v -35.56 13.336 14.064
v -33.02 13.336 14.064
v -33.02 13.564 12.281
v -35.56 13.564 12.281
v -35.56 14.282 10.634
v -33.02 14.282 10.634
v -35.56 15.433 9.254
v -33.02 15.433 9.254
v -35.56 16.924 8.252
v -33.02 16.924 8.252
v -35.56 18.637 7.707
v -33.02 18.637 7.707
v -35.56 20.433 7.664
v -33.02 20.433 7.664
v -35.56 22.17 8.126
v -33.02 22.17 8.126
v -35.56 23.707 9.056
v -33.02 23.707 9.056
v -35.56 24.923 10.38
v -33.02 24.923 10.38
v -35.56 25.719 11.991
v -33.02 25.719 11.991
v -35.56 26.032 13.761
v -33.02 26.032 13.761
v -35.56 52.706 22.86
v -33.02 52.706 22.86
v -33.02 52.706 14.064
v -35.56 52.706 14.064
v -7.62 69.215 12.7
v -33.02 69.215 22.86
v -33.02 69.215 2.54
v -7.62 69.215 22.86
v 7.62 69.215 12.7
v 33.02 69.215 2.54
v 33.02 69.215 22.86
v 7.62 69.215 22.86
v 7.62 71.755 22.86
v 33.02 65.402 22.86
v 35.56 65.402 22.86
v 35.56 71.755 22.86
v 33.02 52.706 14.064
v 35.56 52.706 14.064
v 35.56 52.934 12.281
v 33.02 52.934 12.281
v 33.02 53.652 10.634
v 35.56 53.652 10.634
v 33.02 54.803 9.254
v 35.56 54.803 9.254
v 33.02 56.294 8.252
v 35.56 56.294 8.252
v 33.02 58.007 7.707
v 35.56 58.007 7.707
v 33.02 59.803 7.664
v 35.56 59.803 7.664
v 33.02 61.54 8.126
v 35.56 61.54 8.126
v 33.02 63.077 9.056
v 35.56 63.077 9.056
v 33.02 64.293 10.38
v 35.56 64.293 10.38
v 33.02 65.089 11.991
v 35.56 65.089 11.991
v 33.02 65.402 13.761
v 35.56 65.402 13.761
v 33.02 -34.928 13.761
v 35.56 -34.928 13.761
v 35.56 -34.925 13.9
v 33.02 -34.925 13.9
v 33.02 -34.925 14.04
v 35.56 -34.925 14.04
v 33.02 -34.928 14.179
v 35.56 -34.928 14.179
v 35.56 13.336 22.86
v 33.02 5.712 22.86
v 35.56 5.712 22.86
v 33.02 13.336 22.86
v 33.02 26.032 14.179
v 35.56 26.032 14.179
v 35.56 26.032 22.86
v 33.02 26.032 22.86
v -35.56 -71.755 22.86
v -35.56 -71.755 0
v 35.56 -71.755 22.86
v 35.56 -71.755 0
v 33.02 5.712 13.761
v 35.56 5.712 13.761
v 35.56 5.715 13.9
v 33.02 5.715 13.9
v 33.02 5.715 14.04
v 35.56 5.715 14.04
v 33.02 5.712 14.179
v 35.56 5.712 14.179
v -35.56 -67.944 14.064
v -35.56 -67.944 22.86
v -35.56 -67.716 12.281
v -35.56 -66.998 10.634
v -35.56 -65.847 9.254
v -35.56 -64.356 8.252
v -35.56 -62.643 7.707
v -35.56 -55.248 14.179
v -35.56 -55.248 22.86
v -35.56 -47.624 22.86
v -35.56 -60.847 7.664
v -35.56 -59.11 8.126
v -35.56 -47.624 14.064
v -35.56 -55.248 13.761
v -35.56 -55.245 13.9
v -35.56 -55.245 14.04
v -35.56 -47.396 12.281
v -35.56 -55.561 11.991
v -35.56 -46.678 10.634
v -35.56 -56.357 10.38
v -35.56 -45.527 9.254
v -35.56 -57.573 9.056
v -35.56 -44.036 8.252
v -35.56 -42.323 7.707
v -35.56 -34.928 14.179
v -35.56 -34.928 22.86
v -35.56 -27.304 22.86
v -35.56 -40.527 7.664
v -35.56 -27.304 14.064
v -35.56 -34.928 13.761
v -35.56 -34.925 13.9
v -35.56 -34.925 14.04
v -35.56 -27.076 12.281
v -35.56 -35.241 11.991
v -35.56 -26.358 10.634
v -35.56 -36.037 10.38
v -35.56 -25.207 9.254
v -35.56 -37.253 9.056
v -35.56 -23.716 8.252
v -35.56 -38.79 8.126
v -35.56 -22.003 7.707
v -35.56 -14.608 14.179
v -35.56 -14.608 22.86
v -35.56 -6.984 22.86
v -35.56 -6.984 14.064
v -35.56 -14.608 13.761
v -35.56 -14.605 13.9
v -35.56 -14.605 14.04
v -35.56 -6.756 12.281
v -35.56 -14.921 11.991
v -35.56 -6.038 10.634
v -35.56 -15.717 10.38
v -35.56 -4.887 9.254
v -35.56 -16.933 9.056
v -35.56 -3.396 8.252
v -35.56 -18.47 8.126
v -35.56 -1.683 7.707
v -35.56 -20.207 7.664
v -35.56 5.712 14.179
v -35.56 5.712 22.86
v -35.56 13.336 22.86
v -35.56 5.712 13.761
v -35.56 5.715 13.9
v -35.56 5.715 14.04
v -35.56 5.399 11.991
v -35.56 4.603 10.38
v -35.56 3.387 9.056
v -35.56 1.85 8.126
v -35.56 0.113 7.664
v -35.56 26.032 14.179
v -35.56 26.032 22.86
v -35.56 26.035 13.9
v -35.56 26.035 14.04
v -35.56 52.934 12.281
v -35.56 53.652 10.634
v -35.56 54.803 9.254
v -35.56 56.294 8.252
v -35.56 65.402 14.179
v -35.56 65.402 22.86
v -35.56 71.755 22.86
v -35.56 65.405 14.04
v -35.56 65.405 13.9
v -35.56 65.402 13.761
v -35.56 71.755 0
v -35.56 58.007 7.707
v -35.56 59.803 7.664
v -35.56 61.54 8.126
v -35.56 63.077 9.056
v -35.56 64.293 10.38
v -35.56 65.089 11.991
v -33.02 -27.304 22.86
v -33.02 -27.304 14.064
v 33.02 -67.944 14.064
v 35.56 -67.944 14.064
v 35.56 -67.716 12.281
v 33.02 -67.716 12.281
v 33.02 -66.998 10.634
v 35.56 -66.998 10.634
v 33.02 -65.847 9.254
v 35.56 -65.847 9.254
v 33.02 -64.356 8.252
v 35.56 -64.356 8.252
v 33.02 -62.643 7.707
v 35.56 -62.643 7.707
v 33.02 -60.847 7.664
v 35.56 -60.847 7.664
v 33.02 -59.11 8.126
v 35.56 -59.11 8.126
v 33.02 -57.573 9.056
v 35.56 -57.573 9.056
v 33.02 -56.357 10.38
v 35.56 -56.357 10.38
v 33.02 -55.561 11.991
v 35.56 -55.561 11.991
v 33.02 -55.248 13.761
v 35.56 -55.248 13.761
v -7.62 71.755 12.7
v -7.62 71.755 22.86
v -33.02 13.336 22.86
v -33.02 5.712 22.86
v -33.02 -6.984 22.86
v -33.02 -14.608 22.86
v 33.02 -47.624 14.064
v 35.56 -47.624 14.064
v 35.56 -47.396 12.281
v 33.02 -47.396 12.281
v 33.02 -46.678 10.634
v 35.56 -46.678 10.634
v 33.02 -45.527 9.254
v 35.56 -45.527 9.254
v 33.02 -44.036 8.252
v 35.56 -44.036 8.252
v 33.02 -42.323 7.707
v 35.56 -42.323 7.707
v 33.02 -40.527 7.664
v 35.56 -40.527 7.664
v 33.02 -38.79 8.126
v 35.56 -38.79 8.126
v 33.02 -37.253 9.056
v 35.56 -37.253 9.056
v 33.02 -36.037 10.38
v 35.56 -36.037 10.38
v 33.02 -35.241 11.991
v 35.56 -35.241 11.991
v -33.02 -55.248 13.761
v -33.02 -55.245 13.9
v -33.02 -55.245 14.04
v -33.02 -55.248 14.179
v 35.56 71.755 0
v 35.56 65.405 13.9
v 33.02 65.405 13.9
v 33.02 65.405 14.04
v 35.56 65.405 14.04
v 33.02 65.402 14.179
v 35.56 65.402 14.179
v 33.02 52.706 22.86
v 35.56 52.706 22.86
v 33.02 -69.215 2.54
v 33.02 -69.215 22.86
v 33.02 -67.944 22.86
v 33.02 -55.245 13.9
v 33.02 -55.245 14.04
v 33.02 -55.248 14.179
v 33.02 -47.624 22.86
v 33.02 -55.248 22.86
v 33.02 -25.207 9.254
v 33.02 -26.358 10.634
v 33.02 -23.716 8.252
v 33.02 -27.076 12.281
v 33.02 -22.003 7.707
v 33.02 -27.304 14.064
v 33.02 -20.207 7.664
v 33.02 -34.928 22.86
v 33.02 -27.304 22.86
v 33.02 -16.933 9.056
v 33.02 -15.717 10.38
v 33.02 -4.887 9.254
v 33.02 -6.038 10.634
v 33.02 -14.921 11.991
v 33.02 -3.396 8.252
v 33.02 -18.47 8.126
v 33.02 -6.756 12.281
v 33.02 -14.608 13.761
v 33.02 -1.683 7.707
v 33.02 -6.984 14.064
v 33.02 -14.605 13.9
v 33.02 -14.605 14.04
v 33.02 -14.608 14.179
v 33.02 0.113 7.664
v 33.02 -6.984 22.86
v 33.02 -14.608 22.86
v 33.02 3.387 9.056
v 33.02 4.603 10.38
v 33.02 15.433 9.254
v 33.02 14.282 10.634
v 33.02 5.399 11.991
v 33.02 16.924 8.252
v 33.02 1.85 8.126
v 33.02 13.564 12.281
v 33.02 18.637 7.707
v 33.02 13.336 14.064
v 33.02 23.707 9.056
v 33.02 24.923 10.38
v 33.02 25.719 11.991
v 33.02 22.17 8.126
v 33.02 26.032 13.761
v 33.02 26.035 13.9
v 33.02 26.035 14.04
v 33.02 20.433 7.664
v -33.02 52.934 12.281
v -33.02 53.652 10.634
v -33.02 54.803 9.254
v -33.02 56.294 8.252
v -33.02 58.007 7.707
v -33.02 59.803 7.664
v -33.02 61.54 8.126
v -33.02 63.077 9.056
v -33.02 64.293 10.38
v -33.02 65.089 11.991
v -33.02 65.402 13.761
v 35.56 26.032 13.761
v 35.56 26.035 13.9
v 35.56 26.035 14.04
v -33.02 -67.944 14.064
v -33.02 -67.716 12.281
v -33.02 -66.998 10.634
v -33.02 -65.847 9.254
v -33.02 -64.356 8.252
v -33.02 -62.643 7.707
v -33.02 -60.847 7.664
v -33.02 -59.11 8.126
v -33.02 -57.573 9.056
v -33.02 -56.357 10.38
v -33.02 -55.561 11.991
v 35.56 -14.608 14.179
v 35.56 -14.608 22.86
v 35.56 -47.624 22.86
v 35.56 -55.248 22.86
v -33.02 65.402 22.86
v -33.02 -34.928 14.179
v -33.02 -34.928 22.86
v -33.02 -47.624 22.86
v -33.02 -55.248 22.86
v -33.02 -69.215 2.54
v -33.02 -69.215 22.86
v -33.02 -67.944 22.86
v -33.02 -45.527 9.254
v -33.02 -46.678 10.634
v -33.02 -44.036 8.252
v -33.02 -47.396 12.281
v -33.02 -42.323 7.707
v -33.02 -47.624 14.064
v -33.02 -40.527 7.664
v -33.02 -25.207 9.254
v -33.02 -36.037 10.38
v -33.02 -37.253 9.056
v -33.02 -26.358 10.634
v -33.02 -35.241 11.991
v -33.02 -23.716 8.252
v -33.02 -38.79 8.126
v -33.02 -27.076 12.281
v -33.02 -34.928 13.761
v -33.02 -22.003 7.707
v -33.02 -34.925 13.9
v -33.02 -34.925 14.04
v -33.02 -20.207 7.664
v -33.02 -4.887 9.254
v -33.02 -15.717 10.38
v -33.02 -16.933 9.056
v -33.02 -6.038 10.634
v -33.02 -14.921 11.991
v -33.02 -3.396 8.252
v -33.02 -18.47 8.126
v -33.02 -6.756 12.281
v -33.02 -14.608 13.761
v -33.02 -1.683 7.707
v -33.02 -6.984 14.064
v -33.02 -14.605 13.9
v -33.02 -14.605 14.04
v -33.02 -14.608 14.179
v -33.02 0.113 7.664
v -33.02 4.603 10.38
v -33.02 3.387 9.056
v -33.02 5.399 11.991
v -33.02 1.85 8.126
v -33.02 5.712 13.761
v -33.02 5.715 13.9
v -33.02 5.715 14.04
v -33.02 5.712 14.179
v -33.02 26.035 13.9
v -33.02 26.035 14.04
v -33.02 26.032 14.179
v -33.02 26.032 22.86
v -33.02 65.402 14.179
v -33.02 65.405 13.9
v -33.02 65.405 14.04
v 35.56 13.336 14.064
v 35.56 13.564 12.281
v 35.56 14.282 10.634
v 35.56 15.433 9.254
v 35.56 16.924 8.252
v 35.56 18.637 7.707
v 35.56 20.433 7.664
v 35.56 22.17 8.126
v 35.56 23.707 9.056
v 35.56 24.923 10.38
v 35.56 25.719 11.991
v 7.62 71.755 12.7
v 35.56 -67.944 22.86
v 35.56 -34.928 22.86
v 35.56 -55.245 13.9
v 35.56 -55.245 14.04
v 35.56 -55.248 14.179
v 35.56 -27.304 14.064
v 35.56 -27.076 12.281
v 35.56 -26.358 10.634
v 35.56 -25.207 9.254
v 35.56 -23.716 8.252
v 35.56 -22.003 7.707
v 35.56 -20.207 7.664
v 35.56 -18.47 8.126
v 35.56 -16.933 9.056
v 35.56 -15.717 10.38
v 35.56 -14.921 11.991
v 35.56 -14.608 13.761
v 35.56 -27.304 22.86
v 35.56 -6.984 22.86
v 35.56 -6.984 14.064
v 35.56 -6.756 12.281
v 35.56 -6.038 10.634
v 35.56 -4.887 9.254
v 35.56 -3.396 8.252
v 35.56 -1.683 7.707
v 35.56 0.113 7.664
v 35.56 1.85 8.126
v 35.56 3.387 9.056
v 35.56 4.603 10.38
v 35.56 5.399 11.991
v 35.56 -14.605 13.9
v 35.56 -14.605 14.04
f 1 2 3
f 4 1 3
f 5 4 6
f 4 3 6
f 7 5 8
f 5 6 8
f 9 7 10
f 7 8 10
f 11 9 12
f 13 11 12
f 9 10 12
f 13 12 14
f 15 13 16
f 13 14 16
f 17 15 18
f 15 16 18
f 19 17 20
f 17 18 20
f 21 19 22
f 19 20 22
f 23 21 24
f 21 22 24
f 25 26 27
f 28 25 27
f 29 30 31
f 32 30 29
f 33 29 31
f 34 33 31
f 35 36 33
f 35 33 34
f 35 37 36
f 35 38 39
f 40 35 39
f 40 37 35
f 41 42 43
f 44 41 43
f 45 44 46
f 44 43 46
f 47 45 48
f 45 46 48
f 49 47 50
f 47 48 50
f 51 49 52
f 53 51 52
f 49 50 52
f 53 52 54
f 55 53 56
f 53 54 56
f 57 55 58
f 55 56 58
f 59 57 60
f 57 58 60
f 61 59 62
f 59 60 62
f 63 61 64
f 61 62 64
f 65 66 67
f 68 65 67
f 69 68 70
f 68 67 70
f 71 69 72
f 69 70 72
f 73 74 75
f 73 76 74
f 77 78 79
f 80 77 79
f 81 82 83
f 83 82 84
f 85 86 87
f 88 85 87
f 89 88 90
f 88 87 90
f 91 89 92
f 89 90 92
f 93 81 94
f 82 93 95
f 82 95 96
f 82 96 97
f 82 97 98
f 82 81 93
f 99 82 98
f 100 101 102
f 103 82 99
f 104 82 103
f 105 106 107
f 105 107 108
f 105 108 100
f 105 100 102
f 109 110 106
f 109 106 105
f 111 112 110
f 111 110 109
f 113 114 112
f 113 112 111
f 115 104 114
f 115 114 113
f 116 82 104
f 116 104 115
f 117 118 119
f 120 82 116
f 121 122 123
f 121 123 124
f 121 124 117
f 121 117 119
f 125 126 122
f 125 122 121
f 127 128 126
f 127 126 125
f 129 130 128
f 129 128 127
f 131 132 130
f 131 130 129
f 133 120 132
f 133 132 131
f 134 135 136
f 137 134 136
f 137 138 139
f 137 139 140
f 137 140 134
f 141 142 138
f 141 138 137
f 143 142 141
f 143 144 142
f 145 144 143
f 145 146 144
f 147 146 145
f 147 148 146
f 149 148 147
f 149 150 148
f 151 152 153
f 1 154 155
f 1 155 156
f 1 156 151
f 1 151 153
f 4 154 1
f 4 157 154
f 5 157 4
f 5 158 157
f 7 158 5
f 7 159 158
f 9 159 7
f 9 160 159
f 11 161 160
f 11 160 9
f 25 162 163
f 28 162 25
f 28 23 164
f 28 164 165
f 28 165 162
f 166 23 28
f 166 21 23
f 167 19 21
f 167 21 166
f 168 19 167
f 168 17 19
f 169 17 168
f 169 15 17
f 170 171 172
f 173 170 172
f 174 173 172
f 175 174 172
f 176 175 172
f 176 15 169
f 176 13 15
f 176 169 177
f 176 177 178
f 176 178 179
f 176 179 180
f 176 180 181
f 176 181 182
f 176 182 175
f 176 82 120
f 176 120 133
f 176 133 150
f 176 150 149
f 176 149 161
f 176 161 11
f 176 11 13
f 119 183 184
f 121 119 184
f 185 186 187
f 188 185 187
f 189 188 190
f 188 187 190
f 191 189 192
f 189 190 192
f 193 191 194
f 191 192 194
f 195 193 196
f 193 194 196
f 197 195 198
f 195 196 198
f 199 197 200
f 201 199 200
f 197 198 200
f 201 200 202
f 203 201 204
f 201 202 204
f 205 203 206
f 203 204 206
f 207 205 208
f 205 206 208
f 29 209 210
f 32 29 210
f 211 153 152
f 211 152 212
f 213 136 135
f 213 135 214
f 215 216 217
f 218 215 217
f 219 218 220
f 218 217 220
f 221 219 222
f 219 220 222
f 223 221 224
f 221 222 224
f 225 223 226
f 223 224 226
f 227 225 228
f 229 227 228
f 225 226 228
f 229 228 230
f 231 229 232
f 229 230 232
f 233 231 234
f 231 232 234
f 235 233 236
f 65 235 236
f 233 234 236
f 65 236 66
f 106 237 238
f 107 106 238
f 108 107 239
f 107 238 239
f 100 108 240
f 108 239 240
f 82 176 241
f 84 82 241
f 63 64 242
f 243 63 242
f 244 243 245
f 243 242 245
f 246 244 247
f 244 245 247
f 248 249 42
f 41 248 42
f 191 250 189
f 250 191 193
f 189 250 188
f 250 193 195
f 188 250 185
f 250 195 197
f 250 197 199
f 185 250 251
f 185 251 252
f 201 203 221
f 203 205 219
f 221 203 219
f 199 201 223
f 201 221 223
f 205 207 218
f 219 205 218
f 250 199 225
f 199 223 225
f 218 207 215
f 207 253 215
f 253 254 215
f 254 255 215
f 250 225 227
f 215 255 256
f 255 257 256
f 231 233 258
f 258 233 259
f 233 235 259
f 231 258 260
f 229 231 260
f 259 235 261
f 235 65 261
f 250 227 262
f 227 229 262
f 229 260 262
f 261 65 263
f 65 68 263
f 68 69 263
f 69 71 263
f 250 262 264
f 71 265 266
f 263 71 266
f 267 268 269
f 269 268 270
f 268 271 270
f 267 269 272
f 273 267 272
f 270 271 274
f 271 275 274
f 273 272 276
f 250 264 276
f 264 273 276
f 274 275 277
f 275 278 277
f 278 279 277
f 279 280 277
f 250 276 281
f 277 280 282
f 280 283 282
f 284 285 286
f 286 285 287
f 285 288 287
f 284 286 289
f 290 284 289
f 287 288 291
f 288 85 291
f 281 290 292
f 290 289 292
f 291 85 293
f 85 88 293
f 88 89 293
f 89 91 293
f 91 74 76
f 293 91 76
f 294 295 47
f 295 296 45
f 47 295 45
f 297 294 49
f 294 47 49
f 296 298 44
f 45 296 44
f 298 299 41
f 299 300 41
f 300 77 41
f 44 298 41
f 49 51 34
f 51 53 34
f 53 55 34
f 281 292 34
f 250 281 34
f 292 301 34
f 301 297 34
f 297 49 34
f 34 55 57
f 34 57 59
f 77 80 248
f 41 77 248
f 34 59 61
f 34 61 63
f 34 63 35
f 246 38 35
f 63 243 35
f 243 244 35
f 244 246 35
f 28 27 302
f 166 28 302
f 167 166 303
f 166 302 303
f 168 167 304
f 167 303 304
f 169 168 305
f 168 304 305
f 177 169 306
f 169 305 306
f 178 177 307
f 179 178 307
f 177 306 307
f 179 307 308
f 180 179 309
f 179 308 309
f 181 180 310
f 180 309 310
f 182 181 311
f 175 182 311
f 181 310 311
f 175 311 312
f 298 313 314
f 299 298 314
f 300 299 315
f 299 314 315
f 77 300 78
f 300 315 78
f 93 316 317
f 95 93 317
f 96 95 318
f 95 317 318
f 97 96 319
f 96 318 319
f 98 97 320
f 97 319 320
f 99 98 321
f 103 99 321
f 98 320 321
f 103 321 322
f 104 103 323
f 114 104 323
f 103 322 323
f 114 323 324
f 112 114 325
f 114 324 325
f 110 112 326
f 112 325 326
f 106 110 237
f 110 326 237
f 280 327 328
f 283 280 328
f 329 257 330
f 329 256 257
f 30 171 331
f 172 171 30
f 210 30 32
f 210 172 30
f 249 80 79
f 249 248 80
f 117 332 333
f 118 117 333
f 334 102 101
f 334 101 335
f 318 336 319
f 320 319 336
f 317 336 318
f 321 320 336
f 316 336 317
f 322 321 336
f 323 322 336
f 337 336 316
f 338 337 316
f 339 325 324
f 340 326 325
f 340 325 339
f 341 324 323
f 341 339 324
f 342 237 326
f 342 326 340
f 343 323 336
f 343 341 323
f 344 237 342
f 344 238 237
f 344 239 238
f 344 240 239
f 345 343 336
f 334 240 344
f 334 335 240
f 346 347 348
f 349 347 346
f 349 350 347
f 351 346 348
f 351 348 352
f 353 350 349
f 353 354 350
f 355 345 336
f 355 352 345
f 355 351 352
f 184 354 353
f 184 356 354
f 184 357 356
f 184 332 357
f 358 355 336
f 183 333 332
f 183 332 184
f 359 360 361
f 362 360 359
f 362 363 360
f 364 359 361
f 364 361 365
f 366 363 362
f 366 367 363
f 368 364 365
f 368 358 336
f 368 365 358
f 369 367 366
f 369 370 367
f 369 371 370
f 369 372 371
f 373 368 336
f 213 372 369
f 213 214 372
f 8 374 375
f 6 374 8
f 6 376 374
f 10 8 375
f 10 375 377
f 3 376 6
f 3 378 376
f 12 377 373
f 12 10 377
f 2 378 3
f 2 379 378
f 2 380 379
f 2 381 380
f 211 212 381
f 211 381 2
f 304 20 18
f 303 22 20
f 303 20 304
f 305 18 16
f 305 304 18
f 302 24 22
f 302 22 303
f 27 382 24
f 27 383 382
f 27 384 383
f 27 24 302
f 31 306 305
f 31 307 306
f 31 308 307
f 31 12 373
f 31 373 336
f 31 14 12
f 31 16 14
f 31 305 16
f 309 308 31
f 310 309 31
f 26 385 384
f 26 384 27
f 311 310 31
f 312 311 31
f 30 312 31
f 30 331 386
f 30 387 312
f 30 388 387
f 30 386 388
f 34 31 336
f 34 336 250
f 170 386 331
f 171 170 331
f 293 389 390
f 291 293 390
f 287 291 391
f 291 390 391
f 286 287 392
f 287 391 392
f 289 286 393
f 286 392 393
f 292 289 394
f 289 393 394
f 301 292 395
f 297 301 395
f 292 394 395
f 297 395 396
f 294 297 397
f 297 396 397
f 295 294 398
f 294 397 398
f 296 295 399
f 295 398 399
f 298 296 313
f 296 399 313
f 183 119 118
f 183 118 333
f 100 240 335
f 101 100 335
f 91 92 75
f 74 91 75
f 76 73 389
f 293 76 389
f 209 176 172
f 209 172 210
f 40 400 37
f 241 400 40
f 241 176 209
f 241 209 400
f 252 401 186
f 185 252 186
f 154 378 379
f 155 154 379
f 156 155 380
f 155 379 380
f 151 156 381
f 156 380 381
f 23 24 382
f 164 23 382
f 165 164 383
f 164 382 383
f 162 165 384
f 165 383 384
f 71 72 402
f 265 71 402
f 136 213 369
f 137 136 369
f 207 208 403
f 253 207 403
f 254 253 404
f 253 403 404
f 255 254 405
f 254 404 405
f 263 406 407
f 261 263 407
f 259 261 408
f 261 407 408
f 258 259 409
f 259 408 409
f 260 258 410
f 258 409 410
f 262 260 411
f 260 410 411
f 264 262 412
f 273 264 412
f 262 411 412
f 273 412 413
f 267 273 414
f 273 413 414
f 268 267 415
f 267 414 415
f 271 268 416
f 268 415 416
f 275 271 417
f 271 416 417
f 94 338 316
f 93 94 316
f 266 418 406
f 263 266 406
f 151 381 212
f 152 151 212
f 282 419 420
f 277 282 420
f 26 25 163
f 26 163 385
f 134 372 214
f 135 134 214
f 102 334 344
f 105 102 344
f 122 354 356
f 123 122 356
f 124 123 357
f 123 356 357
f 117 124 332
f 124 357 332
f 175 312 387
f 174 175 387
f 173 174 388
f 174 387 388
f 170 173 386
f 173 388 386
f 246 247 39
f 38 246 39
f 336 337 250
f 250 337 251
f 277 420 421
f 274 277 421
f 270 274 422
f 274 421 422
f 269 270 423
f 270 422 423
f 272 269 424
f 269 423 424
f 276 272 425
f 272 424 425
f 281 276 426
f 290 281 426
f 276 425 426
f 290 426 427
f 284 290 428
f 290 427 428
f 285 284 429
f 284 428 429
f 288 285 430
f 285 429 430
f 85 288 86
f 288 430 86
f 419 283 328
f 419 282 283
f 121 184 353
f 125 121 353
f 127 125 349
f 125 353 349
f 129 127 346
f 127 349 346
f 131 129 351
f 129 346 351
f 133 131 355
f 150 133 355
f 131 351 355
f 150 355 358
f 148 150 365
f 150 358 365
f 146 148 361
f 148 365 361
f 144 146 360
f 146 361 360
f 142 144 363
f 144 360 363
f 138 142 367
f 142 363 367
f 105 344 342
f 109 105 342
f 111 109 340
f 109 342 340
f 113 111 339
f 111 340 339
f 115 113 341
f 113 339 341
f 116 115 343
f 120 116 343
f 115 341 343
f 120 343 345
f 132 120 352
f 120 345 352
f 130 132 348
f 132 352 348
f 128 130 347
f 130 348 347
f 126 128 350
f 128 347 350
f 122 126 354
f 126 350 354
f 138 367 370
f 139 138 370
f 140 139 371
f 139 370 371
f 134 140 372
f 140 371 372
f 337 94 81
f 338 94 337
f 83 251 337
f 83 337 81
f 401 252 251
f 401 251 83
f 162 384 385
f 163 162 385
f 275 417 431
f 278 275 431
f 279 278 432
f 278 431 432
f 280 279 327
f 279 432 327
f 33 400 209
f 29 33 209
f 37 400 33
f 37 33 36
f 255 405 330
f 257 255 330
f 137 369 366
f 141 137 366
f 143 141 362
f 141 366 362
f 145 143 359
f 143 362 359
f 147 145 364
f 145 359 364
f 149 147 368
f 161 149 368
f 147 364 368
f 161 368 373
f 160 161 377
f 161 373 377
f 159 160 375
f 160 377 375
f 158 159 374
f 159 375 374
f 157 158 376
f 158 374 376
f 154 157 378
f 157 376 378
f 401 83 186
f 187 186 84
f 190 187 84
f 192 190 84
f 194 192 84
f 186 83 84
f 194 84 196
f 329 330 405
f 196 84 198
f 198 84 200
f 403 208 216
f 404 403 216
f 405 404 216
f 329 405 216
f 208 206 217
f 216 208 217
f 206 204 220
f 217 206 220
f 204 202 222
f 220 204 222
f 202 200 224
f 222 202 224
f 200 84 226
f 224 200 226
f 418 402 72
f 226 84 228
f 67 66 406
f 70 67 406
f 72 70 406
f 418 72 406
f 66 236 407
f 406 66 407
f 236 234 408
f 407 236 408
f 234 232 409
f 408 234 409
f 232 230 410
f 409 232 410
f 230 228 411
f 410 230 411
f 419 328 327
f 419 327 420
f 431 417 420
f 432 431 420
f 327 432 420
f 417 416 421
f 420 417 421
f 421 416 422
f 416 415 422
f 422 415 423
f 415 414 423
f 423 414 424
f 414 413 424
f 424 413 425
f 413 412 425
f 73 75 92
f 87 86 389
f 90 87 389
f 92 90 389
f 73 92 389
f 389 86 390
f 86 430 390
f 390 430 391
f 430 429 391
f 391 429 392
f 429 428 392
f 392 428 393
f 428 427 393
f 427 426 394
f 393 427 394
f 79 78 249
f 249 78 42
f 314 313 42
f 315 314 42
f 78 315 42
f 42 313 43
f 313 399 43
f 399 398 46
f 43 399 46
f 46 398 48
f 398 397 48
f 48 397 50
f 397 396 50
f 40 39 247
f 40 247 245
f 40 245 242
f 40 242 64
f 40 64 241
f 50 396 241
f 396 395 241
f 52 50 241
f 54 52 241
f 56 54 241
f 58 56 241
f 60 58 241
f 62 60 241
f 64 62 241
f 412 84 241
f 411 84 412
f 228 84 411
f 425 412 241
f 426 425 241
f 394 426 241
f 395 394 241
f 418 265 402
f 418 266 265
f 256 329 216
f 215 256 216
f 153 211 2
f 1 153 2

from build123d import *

# Parameters (mm, degrees)
F0_W     = 71.12
F0_H     = 143.51
F1_DEPTH = 22.86
F2_W     = 66.04
F2_H     = 138.43
F3_DEPTH = 20.32
F5_DEPTH = 71.121
F6_W     = 15.24
F6_H     = 20.32
F7_DEPTH = 25.4


with BuildPart() as f1:
    # F0 (on Top) → F1 (new body)
    with BuildSketch(Plane.XY):
        Rectangle(F0_W, F0_H)
    extrude(amount=F1_DEPTH)

    # F2 (on face) → F3 (cut)
    with BuildSketch(Plane.XY.offset(22.86)):
        Rectangle(F2_W, F2_H)
    extrude(amount=-F3_DEPTH, mode=Mode.SUBTRACT)

    # F4 (on face) → F5 (cut, through all)
    with BuildSketch(Plane.YZ.offset(35.56)):
        with BuildLine():
            Line((-67.944304, 22.86), (-67.944304, 14.064014))
            ThreePointArc((-67.944304, 14.064014), (-61.746635, 7.621811), (-55.248448, 13.760757))
            Line((-55.248448, 13.760757), (-55.248448, 14.179243))
            Line((-55.248448, 14.179243), (-55.248448, 22.86))
            Line((-55.248448, 22.86), (-67.944304, 22.86))
        make_face()
        with BuildLine():
            Line((-55.248448, 14.179243), (-55.248448, 13.760757))
            ThreePointArc((-55.248448, 13.760757), (-55.245, 13.97), (-55.248448, 14.179243))
        make_face()
        with BuildLine():
            Line((-34.928448, 14.179243), (-34.928448, 22.86))
            Line((-34.928448, 22.86), (-47.624304, 22.86))
            Line((-47.624304, 22.86), (-47.624304, 14.064014))
            ThreePointArc((-47.624304, 14.064014), (-41.426635, 7.621811), (-34.928448, 13.760757))
            Line((-34.928448, 13.760757), (-34.928448, 14.179243))
        make_face()
        with BuildLine():
            ThreePointArc((-34.928448, 13.760757), (-34.925, 13.97), (-34.928448, 14.179243))
            Line((-34.928448, 14.179243), (-34.928448, 13.760757))
        make_face()
        with BuildLine():
            Line((-14.608448, 14.179243), (-14.608448, 22.86))
            Line((-14.608448, 22.86), (-27.304304, 22.86))
            Line((-27.304304, 22.86), (-27.304304, 14.064014))
            ThreePointArc((-27.304304, 14.064014), (-21.106635, 7.621811), (-14.608448, 13.760757))
            Line((-14.608448, 13.760757), (-14.608448, 14.179243))
        make_face()
        with BuildLine():
            ThreePointArc((-14.608448, 13.760757), (-14.605, 13.97), (-14.608448, 14.179243))
            Line((-14.608448, 14.179243), (-14.608448, 13.760757))
        make_face()
        with BuildLine():
            Line((5.711552, 14.179243), (5.711552, 22.86))
            Line((5.711552, 22.86), (-6.984304, 22.86))
            Line((-6.984304, 22.86), (-6.984304, 14.064014))
            ThreePointArc((-6.984304, 14.064014), (-0.786635, 7.621811), (5.711552, 13.760757))
            Line((5.711552, 13.760757), (5.711552, 14.179243))
        make_face()
        with BuildLine():
            ThreePointArc((5.711552, 13.760757), (5.715, 13.97), (5.711552, 14.179243))
            Line((5.711552, 14.179243), (5.711552, 13.760757))
        make_face()
        with BuildLine():
            Line((26.031552, 14.179243), (26.031552, 22.86))
            Line((26.031552, 22.86), (13.335696, 22.86))
            Line((13.335696, 22.86), (13.335696, 14.064014))
            ThreePointArc((13.335696, 14.064014), (19.533365, 7.621811), (26.031552, 13.760757))
            Line((26.031552, 13.760757), (26.031552, 14.179243))
        make_face()
        with BuildLine():
            ThreePointArc((26.031552, 13.760757), (26.035, 13.97), (26.031552, 14.179243))
            Line((26.031552, 14.179243), (26.031552, 13.760757))
        make_face()
        with BuildLine():
            Line((52.705696, 22.86), (52.705696, 14.064014))
            ThreePointArc((52.705696, 14.064014), (58.903365, 7.621811), (65.401552, 13.760757))
            Line((65.401552, 13.760757), (65.401552, 14.179243))
            Line((65.401552, 14.179243), (65.401552, 22.86))
            Line((65.401552, 22.86), (52.705696, 22.86))
        make_face()
        with BuildLine():
            Line((65.401552, 14.179243), (65.401552, 13.760757))
            ThreePointArc((65.401552, 13.760757), (65.405, 13.97), (65.401552, 14.179243))
        make_face()
    extrude(amount=-F5_DEPTH, mode=Mode.SUBTRACT)

    # F6 (on face) → F7 (cut)
    with BuildSketch(Plane(origin=(0, 71.755, 0), x_dir=(-1, 0, 0), z_dir=(0, 1, 0))):
        with Locations((0, 22.86)):
            Rectangle(F6_W, F6_H)
    extrude(amount=-F7_DEPTH, mode=Mode.SUBTRACT)


solid = f1.part
